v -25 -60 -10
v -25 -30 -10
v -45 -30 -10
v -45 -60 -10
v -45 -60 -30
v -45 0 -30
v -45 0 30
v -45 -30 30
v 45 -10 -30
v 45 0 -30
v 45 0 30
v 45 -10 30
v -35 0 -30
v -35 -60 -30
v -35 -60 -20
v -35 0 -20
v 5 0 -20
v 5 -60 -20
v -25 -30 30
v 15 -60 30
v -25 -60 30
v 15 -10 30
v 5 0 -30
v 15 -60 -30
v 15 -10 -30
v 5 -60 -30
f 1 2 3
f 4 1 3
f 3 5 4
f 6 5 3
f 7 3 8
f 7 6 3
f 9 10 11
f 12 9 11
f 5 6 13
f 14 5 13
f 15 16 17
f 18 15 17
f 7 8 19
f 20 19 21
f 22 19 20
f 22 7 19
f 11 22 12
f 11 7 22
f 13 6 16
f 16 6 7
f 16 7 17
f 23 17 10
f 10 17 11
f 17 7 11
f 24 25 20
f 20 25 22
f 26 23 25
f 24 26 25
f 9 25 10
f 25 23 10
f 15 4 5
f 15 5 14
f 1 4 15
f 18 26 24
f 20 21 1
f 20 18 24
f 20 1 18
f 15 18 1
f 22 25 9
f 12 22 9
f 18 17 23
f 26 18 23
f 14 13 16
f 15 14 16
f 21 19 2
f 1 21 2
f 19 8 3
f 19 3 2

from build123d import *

# Parameters (mm, degrees)
F1_DEPTH = 60
F0_W     = 30
F0_H     = 60
F2_DEPTH = 10
F0_W_2   = 20
F0_H_2   = 40
F3_DEPTH = 30


with BuildPart() as f1:
    # F0 (on Front) → F1 (new body)
    with BuildSketch(Plane.XZ):
        Polygon((15, -30), (15, 30), (-25, 30), (-25, -10), (-45, -10), (-45, -30), (-35, -30), (-35, -20), (5, -20), (5, -30), align=None)
    extrude(amount=F1_DEPTH)

    # F0 (on Front) → F2 (join)
    with BuildSketch(Plane.XZ):
        with Locations((30, 0)):
            Rectangle(F0_W, F0_H)
    extrude(amount=F2_DEPTH)

    # F0 (on Front) → F3 (join)
    with BuildSketch(Plane.XZ):
        with Locations((-35, 10)):
            Rectangle(F0_W_2, F0_H_2)
    extrude(amount=F3_DEPTH)


solid = f1.part
